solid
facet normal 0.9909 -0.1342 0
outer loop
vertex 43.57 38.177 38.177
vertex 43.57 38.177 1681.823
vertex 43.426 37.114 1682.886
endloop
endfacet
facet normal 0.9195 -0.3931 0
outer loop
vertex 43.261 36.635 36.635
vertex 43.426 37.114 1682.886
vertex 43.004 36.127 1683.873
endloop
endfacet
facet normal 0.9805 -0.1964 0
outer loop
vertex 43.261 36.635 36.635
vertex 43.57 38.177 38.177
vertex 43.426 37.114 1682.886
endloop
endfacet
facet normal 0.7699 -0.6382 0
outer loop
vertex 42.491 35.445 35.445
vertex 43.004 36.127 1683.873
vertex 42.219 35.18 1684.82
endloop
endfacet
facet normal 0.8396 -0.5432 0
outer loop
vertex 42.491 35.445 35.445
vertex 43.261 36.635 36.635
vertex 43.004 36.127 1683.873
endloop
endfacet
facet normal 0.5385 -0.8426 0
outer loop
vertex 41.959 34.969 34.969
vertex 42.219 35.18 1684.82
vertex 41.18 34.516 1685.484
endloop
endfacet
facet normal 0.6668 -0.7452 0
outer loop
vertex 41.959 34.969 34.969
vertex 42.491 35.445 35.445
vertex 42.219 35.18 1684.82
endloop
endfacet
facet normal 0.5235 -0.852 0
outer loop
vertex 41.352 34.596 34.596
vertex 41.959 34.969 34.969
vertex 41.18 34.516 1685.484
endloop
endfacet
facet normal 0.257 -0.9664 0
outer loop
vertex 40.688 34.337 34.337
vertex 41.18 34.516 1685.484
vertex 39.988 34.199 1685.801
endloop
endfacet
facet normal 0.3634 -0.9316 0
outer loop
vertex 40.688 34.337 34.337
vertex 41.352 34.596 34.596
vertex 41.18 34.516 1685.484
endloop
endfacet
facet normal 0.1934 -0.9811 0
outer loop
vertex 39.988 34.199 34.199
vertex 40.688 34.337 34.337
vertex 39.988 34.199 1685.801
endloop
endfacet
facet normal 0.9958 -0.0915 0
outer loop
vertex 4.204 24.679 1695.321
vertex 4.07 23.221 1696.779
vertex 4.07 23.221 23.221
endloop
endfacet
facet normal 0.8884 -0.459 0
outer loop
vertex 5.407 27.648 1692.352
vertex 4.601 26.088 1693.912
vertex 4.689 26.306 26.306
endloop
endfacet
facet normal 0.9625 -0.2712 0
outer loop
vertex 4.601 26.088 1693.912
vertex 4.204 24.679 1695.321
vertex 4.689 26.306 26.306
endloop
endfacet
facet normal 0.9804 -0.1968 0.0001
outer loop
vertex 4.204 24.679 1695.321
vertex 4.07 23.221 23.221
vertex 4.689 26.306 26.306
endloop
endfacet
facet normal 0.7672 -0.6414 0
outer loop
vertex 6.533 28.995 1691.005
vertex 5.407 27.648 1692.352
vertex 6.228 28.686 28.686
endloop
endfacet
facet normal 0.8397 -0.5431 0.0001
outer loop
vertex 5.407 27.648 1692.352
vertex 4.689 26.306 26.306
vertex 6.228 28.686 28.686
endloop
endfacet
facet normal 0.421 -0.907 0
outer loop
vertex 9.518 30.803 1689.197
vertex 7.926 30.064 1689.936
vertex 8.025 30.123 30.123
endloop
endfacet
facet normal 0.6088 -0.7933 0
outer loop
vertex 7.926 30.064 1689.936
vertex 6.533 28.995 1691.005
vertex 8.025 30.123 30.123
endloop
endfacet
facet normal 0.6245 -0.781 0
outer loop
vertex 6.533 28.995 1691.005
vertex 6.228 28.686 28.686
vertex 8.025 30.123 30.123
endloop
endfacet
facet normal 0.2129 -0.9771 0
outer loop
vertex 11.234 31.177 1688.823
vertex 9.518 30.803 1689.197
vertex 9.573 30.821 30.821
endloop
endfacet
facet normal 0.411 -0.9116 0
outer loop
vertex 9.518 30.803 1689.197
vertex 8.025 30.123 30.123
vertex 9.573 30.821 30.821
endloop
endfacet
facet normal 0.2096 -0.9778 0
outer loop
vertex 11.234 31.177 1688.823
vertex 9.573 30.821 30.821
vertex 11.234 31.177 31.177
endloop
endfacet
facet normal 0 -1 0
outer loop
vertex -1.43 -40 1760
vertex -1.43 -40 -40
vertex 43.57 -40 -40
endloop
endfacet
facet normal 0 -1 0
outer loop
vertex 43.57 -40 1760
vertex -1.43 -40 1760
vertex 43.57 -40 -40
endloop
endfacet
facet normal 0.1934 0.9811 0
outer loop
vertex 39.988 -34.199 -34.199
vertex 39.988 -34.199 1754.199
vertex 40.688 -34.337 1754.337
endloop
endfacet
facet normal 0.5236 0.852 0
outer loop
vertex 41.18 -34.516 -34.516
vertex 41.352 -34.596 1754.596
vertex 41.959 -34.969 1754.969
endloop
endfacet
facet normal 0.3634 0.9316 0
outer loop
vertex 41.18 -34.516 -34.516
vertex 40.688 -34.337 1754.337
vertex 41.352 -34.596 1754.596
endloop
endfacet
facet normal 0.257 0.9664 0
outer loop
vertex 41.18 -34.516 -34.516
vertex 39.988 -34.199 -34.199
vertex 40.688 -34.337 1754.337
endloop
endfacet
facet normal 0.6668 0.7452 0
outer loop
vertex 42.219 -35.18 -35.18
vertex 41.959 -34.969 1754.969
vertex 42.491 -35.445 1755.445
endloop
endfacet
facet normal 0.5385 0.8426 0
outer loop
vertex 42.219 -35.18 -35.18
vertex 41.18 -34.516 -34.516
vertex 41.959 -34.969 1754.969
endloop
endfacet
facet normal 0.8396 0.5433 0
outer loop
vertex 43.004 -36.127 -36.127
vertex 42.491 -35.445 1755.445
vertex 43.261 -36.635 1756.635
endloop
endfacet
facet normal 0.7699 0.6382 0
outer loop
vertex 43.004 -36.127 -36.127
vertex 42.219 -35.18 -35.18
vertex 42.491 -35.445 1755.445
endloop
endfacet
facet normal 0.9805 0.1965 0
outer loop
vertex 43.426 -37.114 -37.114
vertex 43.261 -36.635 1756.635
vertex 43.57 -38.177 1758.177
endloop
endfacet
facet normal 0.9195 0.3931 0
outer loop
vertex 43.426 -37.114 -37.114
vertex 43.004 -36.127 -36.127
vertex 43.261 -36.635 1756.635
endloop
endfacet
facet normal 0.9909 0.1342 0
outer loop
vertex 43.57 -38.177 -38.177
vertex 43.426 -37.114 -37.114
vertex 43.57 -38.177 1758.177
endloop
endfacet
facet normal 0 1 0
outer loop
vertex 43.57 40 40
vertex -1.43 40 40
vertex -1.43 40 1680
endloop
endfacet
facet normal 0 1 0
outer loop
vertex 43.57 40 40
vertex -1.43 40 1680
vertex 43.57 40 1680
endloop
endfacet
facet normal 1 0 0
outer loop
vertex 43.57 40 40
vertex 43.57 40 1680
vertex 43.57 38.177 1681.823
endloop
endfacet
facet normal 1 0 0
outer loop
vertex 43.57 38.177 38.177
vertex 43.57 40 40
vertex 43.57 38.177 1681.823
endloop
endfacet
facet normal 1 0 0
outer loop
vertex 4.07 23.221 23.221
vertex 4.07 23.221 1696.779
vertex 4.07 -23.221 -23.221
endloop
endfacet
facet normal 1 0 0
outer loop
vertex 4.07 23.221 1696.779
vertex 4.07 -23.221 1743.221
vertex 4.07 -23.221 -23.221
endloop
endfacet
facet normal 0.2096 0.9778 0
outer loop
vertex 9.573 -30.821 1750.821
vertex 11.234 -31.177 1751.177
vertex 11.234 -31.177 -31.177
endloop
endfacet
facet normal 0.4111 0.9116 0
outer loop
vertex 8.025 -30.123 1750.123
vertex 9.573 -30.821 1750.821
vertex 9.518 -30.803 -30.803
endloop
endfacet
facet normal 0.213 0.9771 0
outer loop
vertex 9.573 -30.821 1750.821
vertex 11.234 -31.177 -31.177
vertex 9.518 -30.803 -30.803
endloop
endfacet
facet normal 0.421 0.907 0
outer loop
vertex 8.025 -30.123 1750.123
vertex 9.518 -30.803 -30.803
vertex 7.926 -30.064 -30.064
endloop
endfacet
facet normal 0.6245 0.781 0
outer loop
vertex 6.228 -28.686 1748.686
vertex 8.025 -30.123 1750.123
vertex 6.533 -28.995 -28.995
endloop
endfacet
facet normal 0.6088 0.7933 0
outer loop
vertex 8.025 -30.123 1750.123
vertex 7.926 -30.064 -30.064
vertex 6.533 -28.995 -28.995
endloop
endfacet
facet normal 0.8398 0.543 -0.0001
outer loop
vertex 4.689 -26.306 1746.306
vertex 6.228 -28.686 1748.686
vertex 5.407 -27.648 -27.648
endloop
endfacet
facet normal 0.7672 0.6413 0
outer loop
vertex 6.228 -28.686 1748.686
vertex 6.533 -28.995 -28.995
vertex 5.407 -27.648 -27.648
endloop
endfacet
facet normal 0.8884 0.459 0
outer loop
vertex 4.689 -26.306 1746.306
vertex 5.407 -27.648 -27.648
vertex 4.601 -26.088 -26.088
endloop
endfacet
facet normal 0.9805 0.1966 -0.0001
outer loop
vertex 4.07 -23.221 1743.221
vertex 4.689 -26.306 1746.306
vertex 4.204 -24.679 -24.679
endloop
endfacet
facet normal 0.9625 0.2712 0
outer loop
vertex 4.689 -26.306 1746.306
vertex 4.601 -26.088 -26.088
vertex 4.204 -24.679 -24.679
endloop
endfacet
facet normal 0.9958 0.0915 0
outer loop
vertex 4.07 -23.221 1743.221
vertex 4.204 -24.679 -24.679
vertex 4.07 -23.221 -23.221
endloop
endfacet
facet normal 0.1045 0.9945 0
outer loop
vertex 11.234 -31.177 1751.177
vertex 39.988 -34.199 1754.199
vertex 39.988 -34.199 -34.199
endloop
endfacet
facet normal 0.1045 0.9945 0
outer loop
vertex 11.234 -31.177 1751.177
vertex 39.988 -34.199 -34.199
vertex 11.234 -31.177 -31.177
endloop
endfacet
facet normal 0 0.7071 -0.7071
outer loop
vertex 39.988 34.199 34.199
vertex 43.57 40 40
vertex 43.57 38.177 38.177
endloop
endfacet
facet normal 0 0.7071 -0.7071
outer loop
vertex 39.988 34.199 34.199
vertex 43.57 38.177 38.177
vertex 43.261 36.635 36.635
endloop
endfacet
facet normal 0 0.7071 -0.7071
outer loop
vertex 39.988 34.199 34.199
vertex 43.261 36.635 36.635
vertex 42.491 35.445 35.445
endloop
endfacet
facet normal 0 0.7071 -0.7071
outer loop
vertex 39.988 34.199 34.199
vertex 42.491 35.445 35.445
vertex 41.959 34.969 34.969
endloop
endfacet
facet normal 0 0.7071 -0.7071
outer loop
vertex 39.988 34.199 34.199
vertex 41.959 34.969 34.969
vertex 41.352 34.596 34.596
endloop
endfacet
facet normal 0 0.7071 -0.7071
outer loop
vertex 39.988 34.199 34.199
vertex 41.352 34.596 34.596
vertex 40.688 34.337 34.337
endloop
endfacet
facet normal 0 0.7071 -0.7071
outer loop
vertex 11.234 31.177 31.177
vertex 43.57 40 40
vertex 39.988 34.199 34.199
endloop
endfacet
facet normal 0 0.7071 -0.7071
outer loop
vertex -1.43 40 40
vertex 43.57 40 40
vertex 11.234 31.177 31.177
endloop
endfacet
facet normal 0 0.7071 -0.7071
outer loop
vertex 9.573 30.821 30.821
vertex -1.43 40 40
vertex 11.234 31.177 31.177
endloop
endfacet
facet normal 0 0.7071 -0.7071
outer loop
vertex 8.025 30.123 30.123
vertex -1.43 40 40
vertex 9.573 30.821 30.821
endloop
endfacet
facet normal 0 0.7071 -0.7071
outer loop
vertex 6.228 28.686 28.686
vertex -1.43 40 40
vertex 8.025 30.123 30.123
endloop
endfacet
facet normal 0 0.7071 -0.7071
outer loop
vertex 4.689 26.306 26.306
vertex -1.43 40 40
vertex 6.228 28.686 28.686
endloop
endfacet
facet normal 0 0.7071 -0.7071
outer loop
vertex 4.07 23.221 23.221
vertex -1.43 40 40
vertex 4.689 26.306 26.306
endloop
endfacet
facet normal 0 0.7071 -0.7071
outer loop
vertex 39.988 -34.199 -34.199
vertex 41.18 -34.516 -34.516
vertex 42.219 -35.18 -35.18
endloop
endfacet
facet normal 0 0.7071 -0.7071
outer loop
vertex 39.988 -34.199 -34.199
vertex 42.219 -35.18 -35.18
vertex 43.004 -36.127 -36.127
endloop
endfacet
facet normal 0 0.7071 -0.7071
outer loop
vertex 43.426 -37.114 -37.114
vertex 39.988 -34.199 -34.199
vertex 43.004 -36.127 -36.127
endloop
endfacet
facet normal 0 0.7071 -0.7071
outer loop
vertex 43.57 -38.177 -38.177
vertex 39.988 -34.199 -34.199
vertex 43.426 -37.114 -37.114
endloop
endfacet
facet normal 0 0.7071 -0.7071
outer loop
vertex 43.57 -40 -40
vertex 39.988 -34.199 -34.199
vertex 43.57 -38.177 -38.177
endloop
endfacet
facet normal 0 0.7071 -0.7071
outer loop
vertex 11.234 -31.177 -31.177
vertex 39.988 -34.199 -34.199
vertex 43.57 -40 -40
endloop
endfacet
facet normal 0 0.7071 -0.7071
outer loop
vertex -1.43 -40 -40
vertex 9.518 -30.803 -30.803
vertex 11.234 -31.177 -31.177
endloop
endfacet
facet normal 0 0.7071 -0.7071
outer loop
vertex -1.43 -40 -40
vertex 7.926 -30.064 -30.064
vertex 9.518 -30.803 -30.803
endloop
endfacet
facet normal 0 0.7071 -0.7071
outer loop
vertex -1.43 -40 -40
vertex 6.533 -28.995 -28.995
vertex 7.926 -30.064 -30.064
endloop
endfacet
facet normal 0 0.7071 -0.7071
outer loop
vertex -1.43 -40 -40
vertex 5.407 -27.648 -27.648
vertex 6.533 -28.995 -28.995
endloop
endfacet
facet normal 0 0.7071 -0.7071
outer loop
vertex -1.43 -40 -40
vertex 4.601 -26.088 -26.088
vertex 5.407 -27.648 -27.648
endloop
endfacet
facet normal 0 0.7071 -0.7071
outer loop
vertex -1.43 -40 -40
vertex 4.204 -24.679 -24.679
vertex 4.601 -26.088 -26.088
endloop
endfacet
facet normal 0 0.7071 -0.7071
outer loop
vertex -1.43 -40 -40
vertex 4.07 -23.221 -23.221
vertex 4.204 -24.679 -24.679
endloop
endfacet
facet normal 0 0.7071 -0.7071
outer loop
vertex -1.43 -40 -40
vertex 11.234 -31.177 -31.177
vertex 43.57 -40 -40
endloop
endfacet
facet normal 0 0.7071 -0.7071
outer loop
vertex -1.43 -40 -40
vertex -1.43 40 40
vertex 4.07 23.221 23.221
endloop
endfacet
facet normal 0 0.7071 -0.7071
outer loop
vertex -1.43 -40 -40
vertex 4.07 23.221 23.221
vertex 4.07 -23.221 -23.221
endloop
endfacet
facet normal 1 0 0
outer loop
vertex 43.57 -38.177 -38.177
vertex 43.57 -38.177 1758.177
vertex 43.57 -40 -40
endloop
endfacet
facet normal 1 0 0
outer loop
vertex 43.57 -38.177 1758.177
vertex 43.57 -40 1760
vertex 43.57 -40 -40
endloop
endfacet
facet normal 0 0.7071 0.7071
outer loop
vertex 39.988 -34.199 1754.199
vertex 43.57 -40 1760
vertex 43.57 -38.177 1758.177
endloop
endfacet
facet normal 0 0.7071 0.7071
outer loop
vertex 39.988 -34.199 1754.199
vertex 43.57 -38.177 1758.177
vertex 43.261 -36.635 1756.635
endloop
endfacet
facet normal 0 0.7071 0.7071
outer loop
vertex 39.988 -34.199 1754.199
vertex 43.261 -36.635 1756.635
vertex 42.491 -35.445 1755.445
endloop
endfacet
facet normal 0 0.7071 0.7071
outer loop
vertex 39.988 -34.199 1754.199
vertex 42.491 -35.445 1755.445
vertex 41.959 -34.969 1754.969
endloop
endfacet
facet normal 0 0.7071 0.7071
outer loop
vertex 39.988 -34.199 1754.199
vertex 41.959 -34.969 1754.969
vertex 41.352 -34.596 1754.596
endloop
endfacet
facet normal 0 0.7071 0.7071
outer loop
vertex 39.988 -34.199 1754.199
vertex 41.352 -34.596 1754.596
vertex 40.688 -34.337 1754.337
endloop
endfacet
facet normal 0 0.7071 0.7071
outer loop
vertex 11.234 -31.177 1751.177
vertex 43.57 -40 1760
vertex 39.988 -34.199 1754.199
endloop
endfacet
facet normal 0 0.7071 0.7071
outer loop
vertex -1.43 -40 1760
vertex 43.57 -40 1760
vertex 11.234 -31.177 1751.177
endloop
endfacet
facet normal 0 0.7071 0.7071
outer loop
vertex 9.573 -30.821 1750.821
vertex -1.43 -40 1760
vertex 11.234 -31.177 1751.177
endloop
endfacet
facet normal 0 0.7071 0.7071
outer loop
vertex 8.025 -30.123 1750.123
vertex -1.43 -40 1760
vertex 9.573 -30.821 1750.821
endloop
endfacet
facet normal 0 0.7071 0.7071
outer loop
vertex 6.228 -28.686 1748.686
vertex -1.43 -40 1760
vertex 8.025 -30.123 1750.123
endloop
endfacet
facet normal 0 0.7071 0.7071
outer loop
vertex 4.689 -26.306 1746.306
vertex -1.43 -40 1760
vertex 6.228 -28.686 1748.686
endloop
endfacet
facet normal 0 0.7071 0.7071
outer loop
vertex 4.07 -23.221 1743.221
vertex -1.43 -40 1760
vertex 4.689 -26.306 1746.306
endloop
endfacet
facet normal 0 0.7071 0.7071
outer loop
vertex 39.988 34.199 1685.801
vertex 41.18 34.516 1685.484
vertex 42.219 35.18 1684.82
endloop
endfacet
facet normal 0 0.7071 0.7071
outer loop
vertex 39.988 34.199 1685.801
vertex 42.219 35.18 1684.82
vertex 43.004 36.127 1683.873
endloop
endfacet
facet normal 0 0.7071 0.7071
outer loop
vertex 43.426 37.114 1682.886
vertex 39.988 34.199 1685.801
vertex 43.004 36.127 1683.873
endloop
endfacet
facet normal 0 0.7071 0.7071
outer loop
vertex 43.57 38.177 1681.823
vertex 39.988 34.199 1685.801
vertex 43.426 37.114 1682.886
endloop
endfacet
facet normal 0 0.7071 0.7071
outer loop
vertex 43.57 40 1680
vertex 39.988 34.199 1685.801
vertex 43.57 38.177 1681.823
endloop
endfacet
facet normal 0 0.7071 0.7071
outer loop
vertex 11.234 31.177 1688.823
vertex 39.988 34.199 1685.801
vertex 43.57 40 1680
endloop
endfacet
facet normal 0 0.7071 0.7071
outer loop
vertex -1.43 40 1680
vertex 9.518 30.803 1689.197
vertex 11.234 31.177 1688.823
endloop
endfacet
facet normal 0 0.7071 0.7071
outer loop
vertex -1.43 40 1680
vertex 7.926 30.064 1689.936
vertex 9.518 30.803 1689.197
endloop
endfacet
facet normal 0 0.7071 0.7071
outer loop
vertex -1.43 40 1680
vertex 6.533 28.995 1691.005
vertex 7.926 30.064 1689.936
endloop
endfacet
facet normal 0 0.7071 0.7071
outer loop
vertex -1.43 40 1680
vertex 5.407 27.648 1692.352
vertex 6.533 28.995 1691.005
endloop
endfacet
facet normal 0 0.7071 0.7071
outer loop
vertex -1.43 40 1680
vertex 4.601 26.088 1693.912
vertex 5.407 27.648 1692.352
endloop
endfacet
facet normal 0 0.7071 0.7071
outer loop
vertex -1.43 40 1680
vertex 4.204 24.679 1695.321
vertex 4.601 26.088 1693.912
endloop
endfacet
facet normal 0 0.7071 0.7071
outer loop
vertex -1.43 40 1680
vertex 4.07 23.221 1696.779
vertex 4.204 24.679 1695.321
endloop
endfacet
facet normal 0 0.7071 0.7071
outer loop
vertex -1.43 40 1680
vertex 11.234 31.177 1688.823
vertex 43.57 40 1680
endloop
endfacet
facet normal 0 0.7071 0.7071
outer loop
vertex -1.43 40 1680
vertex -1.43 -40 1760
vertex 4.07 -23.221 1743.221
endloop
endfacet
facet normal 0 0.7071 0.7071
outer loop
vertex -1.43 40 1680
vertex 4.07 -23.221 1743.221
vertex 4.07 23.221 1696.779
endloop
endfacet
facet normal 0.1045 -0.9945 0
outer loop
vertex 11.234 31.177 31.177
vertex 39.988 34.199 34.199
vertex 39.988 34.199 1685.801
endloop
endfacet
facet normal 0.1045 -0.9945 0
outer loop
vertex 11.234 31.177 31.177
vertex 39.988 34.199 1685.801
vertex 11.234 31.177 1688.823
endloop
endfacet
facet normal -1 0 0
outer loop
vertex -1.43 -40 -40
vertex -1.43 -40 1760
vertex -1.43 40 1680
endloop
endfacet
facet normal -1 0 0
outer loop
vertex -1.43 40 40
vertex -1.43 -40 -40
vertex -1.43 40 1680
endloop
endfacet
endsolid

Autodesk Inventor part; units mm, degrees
ref_plane "Начальная плоскость" through (0, 0, -40) normal (0, 0, 1) x (1, 0, 0)
ref_plane "Конечная плоскость" through (0, 0, 1760) normal (0, 0, 1) x (1, 0, 0)
sketch "Эскиз" plane through (0, 0, 0) normal (0, 0, 1) x (1, 0, 0)
  line L0 (-1.43, 0) -> (-1.43, 40)
  line L1 (-1.43, 40) -> (43.57, 40)
  line L2 (43.57, 40) -> (43.57, 38.1774)
  line L3 (39.9881, 34.1993) -> (11.2338, 31.1771)
  line L4 (4.07, 23.221) -> (4.07, 0)
  line L5 (4.07, 0) -> (-1.43, 0) construction
  line L6 (23.82, 40) -> (23.82, 32.5) construction
  line L7 (43.57, 34.5758) -> (43.57, 32.5) construction
  line L8 (43.57, 32.5) -> (23.82, 32.5) construction
  line L9 (0, 15) -> (0, -27) construction
  line L10 (-5.539, 0) -> (16.0067, 0) construction
  line L11 (-1.43, 0) -> (-1.43, -40)
  line L12 (-1.43, -40) -> (43.57, -40)
  line L13 (43.57, -40) -> (43.57, -38.1774)
  line L14 (39.9881, -34.1993) -> (11.2338, -31.1771)
  line L15 (4.07, -23.221) -> (4.07, 0)
  arc A0 (11.2338, 31.1771) -> (4.07, 23.221) centre (12.07, 23.221) ccw
  arc A1 (4.07, -23.221) -> (11.2338, -31.1771) centre (12.07, -23.221) ccw
  arc A2 (39.9881, 34.1993) -> (43.57, 38.1774) centre (39.57, 38.1774) ccw
  arc A3 (43.57, -38.1774) -> (39.9881, -34.1993) centre (39.57, -38.1774) ccw
  line L16 (0, 56) -> (0, -56) construction
  line L17 (-15.5135, 0) -> (54.308, 0) construction
  point P0 (4.07, 30.4242)
  point P1 (43.57, -34.5758)
  point P2 (4.07, -30.4242)
  point P3 (23.82, -40)
  point P4 (23.82, -32.5)
  dimension "d0" = 5.5
  dimension "d1" = 40
  dimension "d2" = 45
  dimension "d3" = 7.5
  dimension "d4" = 19.75
  dimension "d5" = 2.0758
  dimension "d23" = 8
  dimension "d24" = 4
  dimension "d25" = 1.43
extrude "Тело" add sketch "Эскиз" along normal up to surface (1800 mm away) from surface at -40
sketch "Sketch3" plane through (0, 0, 0) normal (0, 0, 1) x (1, 0, 0)
  line L0 (0, 0) -> (10, 0)
ref_plane "Work Plane3" through (0, 0, 0) normal (0, -1, 0) x (1, 0, 0)
sketch "Sketch4" plane through (0, 0, 0) normal (0, -1, 0) x (1, 0, 0)
  line L0 (-2, -40) -> (12, -40)
  line L1 (-2, 1760) -> (12, 1760)
  dimension "d29" = 1800
ref_plane "РабПлоскость4" through (21.07, -40, -40) normal (0, 0.7071, -0.7071) x (1, 0, 0)
split "Разделение1" plane through (21.07, -40, -40) removes the side toward (0, 0.7071, -0.7071)
ref_plane "РабПлоскость5" through (21.07, -40, 1760) normal (0, 0.7071, 0.7071) x (1, 0, 0)
split "Разделение2" plane through (21.07, -40, 1760) removes the side toward (0, 0.7071, 0.7071)
equation "\"d0\" = G_T"
equation "\"d1\" = 0.5 * G_H"
equation "\"d2\" = G_W"
equation "\"d3\" = G_T1"
equation "\"d4\" = G_C"
equation "\"d23\" = G_IR"
equation "\"d24\" = G_ER"
equation "\"d25\" = ex"
equation "\"d6\" = G_L"
equation "\"G_W\" = 45"
equation "\"G_T\" = 5.5"
equation "\"G_T1\" = 7.5"
equation "\"G_NG\" = 0.105104"
equation "\"G_ER\" = 4"
equation "\"G_IR\" = 8"
equation "\"G_C\" = 19.75"
equation "\"G_L\" = d29"
equation "\"ex\" = 1.43"
equation "\"G_H\" = 80"
properties part number "ISO 657/11 - CH 80 x 8 - 1800" material "Сталь, мягкая"
